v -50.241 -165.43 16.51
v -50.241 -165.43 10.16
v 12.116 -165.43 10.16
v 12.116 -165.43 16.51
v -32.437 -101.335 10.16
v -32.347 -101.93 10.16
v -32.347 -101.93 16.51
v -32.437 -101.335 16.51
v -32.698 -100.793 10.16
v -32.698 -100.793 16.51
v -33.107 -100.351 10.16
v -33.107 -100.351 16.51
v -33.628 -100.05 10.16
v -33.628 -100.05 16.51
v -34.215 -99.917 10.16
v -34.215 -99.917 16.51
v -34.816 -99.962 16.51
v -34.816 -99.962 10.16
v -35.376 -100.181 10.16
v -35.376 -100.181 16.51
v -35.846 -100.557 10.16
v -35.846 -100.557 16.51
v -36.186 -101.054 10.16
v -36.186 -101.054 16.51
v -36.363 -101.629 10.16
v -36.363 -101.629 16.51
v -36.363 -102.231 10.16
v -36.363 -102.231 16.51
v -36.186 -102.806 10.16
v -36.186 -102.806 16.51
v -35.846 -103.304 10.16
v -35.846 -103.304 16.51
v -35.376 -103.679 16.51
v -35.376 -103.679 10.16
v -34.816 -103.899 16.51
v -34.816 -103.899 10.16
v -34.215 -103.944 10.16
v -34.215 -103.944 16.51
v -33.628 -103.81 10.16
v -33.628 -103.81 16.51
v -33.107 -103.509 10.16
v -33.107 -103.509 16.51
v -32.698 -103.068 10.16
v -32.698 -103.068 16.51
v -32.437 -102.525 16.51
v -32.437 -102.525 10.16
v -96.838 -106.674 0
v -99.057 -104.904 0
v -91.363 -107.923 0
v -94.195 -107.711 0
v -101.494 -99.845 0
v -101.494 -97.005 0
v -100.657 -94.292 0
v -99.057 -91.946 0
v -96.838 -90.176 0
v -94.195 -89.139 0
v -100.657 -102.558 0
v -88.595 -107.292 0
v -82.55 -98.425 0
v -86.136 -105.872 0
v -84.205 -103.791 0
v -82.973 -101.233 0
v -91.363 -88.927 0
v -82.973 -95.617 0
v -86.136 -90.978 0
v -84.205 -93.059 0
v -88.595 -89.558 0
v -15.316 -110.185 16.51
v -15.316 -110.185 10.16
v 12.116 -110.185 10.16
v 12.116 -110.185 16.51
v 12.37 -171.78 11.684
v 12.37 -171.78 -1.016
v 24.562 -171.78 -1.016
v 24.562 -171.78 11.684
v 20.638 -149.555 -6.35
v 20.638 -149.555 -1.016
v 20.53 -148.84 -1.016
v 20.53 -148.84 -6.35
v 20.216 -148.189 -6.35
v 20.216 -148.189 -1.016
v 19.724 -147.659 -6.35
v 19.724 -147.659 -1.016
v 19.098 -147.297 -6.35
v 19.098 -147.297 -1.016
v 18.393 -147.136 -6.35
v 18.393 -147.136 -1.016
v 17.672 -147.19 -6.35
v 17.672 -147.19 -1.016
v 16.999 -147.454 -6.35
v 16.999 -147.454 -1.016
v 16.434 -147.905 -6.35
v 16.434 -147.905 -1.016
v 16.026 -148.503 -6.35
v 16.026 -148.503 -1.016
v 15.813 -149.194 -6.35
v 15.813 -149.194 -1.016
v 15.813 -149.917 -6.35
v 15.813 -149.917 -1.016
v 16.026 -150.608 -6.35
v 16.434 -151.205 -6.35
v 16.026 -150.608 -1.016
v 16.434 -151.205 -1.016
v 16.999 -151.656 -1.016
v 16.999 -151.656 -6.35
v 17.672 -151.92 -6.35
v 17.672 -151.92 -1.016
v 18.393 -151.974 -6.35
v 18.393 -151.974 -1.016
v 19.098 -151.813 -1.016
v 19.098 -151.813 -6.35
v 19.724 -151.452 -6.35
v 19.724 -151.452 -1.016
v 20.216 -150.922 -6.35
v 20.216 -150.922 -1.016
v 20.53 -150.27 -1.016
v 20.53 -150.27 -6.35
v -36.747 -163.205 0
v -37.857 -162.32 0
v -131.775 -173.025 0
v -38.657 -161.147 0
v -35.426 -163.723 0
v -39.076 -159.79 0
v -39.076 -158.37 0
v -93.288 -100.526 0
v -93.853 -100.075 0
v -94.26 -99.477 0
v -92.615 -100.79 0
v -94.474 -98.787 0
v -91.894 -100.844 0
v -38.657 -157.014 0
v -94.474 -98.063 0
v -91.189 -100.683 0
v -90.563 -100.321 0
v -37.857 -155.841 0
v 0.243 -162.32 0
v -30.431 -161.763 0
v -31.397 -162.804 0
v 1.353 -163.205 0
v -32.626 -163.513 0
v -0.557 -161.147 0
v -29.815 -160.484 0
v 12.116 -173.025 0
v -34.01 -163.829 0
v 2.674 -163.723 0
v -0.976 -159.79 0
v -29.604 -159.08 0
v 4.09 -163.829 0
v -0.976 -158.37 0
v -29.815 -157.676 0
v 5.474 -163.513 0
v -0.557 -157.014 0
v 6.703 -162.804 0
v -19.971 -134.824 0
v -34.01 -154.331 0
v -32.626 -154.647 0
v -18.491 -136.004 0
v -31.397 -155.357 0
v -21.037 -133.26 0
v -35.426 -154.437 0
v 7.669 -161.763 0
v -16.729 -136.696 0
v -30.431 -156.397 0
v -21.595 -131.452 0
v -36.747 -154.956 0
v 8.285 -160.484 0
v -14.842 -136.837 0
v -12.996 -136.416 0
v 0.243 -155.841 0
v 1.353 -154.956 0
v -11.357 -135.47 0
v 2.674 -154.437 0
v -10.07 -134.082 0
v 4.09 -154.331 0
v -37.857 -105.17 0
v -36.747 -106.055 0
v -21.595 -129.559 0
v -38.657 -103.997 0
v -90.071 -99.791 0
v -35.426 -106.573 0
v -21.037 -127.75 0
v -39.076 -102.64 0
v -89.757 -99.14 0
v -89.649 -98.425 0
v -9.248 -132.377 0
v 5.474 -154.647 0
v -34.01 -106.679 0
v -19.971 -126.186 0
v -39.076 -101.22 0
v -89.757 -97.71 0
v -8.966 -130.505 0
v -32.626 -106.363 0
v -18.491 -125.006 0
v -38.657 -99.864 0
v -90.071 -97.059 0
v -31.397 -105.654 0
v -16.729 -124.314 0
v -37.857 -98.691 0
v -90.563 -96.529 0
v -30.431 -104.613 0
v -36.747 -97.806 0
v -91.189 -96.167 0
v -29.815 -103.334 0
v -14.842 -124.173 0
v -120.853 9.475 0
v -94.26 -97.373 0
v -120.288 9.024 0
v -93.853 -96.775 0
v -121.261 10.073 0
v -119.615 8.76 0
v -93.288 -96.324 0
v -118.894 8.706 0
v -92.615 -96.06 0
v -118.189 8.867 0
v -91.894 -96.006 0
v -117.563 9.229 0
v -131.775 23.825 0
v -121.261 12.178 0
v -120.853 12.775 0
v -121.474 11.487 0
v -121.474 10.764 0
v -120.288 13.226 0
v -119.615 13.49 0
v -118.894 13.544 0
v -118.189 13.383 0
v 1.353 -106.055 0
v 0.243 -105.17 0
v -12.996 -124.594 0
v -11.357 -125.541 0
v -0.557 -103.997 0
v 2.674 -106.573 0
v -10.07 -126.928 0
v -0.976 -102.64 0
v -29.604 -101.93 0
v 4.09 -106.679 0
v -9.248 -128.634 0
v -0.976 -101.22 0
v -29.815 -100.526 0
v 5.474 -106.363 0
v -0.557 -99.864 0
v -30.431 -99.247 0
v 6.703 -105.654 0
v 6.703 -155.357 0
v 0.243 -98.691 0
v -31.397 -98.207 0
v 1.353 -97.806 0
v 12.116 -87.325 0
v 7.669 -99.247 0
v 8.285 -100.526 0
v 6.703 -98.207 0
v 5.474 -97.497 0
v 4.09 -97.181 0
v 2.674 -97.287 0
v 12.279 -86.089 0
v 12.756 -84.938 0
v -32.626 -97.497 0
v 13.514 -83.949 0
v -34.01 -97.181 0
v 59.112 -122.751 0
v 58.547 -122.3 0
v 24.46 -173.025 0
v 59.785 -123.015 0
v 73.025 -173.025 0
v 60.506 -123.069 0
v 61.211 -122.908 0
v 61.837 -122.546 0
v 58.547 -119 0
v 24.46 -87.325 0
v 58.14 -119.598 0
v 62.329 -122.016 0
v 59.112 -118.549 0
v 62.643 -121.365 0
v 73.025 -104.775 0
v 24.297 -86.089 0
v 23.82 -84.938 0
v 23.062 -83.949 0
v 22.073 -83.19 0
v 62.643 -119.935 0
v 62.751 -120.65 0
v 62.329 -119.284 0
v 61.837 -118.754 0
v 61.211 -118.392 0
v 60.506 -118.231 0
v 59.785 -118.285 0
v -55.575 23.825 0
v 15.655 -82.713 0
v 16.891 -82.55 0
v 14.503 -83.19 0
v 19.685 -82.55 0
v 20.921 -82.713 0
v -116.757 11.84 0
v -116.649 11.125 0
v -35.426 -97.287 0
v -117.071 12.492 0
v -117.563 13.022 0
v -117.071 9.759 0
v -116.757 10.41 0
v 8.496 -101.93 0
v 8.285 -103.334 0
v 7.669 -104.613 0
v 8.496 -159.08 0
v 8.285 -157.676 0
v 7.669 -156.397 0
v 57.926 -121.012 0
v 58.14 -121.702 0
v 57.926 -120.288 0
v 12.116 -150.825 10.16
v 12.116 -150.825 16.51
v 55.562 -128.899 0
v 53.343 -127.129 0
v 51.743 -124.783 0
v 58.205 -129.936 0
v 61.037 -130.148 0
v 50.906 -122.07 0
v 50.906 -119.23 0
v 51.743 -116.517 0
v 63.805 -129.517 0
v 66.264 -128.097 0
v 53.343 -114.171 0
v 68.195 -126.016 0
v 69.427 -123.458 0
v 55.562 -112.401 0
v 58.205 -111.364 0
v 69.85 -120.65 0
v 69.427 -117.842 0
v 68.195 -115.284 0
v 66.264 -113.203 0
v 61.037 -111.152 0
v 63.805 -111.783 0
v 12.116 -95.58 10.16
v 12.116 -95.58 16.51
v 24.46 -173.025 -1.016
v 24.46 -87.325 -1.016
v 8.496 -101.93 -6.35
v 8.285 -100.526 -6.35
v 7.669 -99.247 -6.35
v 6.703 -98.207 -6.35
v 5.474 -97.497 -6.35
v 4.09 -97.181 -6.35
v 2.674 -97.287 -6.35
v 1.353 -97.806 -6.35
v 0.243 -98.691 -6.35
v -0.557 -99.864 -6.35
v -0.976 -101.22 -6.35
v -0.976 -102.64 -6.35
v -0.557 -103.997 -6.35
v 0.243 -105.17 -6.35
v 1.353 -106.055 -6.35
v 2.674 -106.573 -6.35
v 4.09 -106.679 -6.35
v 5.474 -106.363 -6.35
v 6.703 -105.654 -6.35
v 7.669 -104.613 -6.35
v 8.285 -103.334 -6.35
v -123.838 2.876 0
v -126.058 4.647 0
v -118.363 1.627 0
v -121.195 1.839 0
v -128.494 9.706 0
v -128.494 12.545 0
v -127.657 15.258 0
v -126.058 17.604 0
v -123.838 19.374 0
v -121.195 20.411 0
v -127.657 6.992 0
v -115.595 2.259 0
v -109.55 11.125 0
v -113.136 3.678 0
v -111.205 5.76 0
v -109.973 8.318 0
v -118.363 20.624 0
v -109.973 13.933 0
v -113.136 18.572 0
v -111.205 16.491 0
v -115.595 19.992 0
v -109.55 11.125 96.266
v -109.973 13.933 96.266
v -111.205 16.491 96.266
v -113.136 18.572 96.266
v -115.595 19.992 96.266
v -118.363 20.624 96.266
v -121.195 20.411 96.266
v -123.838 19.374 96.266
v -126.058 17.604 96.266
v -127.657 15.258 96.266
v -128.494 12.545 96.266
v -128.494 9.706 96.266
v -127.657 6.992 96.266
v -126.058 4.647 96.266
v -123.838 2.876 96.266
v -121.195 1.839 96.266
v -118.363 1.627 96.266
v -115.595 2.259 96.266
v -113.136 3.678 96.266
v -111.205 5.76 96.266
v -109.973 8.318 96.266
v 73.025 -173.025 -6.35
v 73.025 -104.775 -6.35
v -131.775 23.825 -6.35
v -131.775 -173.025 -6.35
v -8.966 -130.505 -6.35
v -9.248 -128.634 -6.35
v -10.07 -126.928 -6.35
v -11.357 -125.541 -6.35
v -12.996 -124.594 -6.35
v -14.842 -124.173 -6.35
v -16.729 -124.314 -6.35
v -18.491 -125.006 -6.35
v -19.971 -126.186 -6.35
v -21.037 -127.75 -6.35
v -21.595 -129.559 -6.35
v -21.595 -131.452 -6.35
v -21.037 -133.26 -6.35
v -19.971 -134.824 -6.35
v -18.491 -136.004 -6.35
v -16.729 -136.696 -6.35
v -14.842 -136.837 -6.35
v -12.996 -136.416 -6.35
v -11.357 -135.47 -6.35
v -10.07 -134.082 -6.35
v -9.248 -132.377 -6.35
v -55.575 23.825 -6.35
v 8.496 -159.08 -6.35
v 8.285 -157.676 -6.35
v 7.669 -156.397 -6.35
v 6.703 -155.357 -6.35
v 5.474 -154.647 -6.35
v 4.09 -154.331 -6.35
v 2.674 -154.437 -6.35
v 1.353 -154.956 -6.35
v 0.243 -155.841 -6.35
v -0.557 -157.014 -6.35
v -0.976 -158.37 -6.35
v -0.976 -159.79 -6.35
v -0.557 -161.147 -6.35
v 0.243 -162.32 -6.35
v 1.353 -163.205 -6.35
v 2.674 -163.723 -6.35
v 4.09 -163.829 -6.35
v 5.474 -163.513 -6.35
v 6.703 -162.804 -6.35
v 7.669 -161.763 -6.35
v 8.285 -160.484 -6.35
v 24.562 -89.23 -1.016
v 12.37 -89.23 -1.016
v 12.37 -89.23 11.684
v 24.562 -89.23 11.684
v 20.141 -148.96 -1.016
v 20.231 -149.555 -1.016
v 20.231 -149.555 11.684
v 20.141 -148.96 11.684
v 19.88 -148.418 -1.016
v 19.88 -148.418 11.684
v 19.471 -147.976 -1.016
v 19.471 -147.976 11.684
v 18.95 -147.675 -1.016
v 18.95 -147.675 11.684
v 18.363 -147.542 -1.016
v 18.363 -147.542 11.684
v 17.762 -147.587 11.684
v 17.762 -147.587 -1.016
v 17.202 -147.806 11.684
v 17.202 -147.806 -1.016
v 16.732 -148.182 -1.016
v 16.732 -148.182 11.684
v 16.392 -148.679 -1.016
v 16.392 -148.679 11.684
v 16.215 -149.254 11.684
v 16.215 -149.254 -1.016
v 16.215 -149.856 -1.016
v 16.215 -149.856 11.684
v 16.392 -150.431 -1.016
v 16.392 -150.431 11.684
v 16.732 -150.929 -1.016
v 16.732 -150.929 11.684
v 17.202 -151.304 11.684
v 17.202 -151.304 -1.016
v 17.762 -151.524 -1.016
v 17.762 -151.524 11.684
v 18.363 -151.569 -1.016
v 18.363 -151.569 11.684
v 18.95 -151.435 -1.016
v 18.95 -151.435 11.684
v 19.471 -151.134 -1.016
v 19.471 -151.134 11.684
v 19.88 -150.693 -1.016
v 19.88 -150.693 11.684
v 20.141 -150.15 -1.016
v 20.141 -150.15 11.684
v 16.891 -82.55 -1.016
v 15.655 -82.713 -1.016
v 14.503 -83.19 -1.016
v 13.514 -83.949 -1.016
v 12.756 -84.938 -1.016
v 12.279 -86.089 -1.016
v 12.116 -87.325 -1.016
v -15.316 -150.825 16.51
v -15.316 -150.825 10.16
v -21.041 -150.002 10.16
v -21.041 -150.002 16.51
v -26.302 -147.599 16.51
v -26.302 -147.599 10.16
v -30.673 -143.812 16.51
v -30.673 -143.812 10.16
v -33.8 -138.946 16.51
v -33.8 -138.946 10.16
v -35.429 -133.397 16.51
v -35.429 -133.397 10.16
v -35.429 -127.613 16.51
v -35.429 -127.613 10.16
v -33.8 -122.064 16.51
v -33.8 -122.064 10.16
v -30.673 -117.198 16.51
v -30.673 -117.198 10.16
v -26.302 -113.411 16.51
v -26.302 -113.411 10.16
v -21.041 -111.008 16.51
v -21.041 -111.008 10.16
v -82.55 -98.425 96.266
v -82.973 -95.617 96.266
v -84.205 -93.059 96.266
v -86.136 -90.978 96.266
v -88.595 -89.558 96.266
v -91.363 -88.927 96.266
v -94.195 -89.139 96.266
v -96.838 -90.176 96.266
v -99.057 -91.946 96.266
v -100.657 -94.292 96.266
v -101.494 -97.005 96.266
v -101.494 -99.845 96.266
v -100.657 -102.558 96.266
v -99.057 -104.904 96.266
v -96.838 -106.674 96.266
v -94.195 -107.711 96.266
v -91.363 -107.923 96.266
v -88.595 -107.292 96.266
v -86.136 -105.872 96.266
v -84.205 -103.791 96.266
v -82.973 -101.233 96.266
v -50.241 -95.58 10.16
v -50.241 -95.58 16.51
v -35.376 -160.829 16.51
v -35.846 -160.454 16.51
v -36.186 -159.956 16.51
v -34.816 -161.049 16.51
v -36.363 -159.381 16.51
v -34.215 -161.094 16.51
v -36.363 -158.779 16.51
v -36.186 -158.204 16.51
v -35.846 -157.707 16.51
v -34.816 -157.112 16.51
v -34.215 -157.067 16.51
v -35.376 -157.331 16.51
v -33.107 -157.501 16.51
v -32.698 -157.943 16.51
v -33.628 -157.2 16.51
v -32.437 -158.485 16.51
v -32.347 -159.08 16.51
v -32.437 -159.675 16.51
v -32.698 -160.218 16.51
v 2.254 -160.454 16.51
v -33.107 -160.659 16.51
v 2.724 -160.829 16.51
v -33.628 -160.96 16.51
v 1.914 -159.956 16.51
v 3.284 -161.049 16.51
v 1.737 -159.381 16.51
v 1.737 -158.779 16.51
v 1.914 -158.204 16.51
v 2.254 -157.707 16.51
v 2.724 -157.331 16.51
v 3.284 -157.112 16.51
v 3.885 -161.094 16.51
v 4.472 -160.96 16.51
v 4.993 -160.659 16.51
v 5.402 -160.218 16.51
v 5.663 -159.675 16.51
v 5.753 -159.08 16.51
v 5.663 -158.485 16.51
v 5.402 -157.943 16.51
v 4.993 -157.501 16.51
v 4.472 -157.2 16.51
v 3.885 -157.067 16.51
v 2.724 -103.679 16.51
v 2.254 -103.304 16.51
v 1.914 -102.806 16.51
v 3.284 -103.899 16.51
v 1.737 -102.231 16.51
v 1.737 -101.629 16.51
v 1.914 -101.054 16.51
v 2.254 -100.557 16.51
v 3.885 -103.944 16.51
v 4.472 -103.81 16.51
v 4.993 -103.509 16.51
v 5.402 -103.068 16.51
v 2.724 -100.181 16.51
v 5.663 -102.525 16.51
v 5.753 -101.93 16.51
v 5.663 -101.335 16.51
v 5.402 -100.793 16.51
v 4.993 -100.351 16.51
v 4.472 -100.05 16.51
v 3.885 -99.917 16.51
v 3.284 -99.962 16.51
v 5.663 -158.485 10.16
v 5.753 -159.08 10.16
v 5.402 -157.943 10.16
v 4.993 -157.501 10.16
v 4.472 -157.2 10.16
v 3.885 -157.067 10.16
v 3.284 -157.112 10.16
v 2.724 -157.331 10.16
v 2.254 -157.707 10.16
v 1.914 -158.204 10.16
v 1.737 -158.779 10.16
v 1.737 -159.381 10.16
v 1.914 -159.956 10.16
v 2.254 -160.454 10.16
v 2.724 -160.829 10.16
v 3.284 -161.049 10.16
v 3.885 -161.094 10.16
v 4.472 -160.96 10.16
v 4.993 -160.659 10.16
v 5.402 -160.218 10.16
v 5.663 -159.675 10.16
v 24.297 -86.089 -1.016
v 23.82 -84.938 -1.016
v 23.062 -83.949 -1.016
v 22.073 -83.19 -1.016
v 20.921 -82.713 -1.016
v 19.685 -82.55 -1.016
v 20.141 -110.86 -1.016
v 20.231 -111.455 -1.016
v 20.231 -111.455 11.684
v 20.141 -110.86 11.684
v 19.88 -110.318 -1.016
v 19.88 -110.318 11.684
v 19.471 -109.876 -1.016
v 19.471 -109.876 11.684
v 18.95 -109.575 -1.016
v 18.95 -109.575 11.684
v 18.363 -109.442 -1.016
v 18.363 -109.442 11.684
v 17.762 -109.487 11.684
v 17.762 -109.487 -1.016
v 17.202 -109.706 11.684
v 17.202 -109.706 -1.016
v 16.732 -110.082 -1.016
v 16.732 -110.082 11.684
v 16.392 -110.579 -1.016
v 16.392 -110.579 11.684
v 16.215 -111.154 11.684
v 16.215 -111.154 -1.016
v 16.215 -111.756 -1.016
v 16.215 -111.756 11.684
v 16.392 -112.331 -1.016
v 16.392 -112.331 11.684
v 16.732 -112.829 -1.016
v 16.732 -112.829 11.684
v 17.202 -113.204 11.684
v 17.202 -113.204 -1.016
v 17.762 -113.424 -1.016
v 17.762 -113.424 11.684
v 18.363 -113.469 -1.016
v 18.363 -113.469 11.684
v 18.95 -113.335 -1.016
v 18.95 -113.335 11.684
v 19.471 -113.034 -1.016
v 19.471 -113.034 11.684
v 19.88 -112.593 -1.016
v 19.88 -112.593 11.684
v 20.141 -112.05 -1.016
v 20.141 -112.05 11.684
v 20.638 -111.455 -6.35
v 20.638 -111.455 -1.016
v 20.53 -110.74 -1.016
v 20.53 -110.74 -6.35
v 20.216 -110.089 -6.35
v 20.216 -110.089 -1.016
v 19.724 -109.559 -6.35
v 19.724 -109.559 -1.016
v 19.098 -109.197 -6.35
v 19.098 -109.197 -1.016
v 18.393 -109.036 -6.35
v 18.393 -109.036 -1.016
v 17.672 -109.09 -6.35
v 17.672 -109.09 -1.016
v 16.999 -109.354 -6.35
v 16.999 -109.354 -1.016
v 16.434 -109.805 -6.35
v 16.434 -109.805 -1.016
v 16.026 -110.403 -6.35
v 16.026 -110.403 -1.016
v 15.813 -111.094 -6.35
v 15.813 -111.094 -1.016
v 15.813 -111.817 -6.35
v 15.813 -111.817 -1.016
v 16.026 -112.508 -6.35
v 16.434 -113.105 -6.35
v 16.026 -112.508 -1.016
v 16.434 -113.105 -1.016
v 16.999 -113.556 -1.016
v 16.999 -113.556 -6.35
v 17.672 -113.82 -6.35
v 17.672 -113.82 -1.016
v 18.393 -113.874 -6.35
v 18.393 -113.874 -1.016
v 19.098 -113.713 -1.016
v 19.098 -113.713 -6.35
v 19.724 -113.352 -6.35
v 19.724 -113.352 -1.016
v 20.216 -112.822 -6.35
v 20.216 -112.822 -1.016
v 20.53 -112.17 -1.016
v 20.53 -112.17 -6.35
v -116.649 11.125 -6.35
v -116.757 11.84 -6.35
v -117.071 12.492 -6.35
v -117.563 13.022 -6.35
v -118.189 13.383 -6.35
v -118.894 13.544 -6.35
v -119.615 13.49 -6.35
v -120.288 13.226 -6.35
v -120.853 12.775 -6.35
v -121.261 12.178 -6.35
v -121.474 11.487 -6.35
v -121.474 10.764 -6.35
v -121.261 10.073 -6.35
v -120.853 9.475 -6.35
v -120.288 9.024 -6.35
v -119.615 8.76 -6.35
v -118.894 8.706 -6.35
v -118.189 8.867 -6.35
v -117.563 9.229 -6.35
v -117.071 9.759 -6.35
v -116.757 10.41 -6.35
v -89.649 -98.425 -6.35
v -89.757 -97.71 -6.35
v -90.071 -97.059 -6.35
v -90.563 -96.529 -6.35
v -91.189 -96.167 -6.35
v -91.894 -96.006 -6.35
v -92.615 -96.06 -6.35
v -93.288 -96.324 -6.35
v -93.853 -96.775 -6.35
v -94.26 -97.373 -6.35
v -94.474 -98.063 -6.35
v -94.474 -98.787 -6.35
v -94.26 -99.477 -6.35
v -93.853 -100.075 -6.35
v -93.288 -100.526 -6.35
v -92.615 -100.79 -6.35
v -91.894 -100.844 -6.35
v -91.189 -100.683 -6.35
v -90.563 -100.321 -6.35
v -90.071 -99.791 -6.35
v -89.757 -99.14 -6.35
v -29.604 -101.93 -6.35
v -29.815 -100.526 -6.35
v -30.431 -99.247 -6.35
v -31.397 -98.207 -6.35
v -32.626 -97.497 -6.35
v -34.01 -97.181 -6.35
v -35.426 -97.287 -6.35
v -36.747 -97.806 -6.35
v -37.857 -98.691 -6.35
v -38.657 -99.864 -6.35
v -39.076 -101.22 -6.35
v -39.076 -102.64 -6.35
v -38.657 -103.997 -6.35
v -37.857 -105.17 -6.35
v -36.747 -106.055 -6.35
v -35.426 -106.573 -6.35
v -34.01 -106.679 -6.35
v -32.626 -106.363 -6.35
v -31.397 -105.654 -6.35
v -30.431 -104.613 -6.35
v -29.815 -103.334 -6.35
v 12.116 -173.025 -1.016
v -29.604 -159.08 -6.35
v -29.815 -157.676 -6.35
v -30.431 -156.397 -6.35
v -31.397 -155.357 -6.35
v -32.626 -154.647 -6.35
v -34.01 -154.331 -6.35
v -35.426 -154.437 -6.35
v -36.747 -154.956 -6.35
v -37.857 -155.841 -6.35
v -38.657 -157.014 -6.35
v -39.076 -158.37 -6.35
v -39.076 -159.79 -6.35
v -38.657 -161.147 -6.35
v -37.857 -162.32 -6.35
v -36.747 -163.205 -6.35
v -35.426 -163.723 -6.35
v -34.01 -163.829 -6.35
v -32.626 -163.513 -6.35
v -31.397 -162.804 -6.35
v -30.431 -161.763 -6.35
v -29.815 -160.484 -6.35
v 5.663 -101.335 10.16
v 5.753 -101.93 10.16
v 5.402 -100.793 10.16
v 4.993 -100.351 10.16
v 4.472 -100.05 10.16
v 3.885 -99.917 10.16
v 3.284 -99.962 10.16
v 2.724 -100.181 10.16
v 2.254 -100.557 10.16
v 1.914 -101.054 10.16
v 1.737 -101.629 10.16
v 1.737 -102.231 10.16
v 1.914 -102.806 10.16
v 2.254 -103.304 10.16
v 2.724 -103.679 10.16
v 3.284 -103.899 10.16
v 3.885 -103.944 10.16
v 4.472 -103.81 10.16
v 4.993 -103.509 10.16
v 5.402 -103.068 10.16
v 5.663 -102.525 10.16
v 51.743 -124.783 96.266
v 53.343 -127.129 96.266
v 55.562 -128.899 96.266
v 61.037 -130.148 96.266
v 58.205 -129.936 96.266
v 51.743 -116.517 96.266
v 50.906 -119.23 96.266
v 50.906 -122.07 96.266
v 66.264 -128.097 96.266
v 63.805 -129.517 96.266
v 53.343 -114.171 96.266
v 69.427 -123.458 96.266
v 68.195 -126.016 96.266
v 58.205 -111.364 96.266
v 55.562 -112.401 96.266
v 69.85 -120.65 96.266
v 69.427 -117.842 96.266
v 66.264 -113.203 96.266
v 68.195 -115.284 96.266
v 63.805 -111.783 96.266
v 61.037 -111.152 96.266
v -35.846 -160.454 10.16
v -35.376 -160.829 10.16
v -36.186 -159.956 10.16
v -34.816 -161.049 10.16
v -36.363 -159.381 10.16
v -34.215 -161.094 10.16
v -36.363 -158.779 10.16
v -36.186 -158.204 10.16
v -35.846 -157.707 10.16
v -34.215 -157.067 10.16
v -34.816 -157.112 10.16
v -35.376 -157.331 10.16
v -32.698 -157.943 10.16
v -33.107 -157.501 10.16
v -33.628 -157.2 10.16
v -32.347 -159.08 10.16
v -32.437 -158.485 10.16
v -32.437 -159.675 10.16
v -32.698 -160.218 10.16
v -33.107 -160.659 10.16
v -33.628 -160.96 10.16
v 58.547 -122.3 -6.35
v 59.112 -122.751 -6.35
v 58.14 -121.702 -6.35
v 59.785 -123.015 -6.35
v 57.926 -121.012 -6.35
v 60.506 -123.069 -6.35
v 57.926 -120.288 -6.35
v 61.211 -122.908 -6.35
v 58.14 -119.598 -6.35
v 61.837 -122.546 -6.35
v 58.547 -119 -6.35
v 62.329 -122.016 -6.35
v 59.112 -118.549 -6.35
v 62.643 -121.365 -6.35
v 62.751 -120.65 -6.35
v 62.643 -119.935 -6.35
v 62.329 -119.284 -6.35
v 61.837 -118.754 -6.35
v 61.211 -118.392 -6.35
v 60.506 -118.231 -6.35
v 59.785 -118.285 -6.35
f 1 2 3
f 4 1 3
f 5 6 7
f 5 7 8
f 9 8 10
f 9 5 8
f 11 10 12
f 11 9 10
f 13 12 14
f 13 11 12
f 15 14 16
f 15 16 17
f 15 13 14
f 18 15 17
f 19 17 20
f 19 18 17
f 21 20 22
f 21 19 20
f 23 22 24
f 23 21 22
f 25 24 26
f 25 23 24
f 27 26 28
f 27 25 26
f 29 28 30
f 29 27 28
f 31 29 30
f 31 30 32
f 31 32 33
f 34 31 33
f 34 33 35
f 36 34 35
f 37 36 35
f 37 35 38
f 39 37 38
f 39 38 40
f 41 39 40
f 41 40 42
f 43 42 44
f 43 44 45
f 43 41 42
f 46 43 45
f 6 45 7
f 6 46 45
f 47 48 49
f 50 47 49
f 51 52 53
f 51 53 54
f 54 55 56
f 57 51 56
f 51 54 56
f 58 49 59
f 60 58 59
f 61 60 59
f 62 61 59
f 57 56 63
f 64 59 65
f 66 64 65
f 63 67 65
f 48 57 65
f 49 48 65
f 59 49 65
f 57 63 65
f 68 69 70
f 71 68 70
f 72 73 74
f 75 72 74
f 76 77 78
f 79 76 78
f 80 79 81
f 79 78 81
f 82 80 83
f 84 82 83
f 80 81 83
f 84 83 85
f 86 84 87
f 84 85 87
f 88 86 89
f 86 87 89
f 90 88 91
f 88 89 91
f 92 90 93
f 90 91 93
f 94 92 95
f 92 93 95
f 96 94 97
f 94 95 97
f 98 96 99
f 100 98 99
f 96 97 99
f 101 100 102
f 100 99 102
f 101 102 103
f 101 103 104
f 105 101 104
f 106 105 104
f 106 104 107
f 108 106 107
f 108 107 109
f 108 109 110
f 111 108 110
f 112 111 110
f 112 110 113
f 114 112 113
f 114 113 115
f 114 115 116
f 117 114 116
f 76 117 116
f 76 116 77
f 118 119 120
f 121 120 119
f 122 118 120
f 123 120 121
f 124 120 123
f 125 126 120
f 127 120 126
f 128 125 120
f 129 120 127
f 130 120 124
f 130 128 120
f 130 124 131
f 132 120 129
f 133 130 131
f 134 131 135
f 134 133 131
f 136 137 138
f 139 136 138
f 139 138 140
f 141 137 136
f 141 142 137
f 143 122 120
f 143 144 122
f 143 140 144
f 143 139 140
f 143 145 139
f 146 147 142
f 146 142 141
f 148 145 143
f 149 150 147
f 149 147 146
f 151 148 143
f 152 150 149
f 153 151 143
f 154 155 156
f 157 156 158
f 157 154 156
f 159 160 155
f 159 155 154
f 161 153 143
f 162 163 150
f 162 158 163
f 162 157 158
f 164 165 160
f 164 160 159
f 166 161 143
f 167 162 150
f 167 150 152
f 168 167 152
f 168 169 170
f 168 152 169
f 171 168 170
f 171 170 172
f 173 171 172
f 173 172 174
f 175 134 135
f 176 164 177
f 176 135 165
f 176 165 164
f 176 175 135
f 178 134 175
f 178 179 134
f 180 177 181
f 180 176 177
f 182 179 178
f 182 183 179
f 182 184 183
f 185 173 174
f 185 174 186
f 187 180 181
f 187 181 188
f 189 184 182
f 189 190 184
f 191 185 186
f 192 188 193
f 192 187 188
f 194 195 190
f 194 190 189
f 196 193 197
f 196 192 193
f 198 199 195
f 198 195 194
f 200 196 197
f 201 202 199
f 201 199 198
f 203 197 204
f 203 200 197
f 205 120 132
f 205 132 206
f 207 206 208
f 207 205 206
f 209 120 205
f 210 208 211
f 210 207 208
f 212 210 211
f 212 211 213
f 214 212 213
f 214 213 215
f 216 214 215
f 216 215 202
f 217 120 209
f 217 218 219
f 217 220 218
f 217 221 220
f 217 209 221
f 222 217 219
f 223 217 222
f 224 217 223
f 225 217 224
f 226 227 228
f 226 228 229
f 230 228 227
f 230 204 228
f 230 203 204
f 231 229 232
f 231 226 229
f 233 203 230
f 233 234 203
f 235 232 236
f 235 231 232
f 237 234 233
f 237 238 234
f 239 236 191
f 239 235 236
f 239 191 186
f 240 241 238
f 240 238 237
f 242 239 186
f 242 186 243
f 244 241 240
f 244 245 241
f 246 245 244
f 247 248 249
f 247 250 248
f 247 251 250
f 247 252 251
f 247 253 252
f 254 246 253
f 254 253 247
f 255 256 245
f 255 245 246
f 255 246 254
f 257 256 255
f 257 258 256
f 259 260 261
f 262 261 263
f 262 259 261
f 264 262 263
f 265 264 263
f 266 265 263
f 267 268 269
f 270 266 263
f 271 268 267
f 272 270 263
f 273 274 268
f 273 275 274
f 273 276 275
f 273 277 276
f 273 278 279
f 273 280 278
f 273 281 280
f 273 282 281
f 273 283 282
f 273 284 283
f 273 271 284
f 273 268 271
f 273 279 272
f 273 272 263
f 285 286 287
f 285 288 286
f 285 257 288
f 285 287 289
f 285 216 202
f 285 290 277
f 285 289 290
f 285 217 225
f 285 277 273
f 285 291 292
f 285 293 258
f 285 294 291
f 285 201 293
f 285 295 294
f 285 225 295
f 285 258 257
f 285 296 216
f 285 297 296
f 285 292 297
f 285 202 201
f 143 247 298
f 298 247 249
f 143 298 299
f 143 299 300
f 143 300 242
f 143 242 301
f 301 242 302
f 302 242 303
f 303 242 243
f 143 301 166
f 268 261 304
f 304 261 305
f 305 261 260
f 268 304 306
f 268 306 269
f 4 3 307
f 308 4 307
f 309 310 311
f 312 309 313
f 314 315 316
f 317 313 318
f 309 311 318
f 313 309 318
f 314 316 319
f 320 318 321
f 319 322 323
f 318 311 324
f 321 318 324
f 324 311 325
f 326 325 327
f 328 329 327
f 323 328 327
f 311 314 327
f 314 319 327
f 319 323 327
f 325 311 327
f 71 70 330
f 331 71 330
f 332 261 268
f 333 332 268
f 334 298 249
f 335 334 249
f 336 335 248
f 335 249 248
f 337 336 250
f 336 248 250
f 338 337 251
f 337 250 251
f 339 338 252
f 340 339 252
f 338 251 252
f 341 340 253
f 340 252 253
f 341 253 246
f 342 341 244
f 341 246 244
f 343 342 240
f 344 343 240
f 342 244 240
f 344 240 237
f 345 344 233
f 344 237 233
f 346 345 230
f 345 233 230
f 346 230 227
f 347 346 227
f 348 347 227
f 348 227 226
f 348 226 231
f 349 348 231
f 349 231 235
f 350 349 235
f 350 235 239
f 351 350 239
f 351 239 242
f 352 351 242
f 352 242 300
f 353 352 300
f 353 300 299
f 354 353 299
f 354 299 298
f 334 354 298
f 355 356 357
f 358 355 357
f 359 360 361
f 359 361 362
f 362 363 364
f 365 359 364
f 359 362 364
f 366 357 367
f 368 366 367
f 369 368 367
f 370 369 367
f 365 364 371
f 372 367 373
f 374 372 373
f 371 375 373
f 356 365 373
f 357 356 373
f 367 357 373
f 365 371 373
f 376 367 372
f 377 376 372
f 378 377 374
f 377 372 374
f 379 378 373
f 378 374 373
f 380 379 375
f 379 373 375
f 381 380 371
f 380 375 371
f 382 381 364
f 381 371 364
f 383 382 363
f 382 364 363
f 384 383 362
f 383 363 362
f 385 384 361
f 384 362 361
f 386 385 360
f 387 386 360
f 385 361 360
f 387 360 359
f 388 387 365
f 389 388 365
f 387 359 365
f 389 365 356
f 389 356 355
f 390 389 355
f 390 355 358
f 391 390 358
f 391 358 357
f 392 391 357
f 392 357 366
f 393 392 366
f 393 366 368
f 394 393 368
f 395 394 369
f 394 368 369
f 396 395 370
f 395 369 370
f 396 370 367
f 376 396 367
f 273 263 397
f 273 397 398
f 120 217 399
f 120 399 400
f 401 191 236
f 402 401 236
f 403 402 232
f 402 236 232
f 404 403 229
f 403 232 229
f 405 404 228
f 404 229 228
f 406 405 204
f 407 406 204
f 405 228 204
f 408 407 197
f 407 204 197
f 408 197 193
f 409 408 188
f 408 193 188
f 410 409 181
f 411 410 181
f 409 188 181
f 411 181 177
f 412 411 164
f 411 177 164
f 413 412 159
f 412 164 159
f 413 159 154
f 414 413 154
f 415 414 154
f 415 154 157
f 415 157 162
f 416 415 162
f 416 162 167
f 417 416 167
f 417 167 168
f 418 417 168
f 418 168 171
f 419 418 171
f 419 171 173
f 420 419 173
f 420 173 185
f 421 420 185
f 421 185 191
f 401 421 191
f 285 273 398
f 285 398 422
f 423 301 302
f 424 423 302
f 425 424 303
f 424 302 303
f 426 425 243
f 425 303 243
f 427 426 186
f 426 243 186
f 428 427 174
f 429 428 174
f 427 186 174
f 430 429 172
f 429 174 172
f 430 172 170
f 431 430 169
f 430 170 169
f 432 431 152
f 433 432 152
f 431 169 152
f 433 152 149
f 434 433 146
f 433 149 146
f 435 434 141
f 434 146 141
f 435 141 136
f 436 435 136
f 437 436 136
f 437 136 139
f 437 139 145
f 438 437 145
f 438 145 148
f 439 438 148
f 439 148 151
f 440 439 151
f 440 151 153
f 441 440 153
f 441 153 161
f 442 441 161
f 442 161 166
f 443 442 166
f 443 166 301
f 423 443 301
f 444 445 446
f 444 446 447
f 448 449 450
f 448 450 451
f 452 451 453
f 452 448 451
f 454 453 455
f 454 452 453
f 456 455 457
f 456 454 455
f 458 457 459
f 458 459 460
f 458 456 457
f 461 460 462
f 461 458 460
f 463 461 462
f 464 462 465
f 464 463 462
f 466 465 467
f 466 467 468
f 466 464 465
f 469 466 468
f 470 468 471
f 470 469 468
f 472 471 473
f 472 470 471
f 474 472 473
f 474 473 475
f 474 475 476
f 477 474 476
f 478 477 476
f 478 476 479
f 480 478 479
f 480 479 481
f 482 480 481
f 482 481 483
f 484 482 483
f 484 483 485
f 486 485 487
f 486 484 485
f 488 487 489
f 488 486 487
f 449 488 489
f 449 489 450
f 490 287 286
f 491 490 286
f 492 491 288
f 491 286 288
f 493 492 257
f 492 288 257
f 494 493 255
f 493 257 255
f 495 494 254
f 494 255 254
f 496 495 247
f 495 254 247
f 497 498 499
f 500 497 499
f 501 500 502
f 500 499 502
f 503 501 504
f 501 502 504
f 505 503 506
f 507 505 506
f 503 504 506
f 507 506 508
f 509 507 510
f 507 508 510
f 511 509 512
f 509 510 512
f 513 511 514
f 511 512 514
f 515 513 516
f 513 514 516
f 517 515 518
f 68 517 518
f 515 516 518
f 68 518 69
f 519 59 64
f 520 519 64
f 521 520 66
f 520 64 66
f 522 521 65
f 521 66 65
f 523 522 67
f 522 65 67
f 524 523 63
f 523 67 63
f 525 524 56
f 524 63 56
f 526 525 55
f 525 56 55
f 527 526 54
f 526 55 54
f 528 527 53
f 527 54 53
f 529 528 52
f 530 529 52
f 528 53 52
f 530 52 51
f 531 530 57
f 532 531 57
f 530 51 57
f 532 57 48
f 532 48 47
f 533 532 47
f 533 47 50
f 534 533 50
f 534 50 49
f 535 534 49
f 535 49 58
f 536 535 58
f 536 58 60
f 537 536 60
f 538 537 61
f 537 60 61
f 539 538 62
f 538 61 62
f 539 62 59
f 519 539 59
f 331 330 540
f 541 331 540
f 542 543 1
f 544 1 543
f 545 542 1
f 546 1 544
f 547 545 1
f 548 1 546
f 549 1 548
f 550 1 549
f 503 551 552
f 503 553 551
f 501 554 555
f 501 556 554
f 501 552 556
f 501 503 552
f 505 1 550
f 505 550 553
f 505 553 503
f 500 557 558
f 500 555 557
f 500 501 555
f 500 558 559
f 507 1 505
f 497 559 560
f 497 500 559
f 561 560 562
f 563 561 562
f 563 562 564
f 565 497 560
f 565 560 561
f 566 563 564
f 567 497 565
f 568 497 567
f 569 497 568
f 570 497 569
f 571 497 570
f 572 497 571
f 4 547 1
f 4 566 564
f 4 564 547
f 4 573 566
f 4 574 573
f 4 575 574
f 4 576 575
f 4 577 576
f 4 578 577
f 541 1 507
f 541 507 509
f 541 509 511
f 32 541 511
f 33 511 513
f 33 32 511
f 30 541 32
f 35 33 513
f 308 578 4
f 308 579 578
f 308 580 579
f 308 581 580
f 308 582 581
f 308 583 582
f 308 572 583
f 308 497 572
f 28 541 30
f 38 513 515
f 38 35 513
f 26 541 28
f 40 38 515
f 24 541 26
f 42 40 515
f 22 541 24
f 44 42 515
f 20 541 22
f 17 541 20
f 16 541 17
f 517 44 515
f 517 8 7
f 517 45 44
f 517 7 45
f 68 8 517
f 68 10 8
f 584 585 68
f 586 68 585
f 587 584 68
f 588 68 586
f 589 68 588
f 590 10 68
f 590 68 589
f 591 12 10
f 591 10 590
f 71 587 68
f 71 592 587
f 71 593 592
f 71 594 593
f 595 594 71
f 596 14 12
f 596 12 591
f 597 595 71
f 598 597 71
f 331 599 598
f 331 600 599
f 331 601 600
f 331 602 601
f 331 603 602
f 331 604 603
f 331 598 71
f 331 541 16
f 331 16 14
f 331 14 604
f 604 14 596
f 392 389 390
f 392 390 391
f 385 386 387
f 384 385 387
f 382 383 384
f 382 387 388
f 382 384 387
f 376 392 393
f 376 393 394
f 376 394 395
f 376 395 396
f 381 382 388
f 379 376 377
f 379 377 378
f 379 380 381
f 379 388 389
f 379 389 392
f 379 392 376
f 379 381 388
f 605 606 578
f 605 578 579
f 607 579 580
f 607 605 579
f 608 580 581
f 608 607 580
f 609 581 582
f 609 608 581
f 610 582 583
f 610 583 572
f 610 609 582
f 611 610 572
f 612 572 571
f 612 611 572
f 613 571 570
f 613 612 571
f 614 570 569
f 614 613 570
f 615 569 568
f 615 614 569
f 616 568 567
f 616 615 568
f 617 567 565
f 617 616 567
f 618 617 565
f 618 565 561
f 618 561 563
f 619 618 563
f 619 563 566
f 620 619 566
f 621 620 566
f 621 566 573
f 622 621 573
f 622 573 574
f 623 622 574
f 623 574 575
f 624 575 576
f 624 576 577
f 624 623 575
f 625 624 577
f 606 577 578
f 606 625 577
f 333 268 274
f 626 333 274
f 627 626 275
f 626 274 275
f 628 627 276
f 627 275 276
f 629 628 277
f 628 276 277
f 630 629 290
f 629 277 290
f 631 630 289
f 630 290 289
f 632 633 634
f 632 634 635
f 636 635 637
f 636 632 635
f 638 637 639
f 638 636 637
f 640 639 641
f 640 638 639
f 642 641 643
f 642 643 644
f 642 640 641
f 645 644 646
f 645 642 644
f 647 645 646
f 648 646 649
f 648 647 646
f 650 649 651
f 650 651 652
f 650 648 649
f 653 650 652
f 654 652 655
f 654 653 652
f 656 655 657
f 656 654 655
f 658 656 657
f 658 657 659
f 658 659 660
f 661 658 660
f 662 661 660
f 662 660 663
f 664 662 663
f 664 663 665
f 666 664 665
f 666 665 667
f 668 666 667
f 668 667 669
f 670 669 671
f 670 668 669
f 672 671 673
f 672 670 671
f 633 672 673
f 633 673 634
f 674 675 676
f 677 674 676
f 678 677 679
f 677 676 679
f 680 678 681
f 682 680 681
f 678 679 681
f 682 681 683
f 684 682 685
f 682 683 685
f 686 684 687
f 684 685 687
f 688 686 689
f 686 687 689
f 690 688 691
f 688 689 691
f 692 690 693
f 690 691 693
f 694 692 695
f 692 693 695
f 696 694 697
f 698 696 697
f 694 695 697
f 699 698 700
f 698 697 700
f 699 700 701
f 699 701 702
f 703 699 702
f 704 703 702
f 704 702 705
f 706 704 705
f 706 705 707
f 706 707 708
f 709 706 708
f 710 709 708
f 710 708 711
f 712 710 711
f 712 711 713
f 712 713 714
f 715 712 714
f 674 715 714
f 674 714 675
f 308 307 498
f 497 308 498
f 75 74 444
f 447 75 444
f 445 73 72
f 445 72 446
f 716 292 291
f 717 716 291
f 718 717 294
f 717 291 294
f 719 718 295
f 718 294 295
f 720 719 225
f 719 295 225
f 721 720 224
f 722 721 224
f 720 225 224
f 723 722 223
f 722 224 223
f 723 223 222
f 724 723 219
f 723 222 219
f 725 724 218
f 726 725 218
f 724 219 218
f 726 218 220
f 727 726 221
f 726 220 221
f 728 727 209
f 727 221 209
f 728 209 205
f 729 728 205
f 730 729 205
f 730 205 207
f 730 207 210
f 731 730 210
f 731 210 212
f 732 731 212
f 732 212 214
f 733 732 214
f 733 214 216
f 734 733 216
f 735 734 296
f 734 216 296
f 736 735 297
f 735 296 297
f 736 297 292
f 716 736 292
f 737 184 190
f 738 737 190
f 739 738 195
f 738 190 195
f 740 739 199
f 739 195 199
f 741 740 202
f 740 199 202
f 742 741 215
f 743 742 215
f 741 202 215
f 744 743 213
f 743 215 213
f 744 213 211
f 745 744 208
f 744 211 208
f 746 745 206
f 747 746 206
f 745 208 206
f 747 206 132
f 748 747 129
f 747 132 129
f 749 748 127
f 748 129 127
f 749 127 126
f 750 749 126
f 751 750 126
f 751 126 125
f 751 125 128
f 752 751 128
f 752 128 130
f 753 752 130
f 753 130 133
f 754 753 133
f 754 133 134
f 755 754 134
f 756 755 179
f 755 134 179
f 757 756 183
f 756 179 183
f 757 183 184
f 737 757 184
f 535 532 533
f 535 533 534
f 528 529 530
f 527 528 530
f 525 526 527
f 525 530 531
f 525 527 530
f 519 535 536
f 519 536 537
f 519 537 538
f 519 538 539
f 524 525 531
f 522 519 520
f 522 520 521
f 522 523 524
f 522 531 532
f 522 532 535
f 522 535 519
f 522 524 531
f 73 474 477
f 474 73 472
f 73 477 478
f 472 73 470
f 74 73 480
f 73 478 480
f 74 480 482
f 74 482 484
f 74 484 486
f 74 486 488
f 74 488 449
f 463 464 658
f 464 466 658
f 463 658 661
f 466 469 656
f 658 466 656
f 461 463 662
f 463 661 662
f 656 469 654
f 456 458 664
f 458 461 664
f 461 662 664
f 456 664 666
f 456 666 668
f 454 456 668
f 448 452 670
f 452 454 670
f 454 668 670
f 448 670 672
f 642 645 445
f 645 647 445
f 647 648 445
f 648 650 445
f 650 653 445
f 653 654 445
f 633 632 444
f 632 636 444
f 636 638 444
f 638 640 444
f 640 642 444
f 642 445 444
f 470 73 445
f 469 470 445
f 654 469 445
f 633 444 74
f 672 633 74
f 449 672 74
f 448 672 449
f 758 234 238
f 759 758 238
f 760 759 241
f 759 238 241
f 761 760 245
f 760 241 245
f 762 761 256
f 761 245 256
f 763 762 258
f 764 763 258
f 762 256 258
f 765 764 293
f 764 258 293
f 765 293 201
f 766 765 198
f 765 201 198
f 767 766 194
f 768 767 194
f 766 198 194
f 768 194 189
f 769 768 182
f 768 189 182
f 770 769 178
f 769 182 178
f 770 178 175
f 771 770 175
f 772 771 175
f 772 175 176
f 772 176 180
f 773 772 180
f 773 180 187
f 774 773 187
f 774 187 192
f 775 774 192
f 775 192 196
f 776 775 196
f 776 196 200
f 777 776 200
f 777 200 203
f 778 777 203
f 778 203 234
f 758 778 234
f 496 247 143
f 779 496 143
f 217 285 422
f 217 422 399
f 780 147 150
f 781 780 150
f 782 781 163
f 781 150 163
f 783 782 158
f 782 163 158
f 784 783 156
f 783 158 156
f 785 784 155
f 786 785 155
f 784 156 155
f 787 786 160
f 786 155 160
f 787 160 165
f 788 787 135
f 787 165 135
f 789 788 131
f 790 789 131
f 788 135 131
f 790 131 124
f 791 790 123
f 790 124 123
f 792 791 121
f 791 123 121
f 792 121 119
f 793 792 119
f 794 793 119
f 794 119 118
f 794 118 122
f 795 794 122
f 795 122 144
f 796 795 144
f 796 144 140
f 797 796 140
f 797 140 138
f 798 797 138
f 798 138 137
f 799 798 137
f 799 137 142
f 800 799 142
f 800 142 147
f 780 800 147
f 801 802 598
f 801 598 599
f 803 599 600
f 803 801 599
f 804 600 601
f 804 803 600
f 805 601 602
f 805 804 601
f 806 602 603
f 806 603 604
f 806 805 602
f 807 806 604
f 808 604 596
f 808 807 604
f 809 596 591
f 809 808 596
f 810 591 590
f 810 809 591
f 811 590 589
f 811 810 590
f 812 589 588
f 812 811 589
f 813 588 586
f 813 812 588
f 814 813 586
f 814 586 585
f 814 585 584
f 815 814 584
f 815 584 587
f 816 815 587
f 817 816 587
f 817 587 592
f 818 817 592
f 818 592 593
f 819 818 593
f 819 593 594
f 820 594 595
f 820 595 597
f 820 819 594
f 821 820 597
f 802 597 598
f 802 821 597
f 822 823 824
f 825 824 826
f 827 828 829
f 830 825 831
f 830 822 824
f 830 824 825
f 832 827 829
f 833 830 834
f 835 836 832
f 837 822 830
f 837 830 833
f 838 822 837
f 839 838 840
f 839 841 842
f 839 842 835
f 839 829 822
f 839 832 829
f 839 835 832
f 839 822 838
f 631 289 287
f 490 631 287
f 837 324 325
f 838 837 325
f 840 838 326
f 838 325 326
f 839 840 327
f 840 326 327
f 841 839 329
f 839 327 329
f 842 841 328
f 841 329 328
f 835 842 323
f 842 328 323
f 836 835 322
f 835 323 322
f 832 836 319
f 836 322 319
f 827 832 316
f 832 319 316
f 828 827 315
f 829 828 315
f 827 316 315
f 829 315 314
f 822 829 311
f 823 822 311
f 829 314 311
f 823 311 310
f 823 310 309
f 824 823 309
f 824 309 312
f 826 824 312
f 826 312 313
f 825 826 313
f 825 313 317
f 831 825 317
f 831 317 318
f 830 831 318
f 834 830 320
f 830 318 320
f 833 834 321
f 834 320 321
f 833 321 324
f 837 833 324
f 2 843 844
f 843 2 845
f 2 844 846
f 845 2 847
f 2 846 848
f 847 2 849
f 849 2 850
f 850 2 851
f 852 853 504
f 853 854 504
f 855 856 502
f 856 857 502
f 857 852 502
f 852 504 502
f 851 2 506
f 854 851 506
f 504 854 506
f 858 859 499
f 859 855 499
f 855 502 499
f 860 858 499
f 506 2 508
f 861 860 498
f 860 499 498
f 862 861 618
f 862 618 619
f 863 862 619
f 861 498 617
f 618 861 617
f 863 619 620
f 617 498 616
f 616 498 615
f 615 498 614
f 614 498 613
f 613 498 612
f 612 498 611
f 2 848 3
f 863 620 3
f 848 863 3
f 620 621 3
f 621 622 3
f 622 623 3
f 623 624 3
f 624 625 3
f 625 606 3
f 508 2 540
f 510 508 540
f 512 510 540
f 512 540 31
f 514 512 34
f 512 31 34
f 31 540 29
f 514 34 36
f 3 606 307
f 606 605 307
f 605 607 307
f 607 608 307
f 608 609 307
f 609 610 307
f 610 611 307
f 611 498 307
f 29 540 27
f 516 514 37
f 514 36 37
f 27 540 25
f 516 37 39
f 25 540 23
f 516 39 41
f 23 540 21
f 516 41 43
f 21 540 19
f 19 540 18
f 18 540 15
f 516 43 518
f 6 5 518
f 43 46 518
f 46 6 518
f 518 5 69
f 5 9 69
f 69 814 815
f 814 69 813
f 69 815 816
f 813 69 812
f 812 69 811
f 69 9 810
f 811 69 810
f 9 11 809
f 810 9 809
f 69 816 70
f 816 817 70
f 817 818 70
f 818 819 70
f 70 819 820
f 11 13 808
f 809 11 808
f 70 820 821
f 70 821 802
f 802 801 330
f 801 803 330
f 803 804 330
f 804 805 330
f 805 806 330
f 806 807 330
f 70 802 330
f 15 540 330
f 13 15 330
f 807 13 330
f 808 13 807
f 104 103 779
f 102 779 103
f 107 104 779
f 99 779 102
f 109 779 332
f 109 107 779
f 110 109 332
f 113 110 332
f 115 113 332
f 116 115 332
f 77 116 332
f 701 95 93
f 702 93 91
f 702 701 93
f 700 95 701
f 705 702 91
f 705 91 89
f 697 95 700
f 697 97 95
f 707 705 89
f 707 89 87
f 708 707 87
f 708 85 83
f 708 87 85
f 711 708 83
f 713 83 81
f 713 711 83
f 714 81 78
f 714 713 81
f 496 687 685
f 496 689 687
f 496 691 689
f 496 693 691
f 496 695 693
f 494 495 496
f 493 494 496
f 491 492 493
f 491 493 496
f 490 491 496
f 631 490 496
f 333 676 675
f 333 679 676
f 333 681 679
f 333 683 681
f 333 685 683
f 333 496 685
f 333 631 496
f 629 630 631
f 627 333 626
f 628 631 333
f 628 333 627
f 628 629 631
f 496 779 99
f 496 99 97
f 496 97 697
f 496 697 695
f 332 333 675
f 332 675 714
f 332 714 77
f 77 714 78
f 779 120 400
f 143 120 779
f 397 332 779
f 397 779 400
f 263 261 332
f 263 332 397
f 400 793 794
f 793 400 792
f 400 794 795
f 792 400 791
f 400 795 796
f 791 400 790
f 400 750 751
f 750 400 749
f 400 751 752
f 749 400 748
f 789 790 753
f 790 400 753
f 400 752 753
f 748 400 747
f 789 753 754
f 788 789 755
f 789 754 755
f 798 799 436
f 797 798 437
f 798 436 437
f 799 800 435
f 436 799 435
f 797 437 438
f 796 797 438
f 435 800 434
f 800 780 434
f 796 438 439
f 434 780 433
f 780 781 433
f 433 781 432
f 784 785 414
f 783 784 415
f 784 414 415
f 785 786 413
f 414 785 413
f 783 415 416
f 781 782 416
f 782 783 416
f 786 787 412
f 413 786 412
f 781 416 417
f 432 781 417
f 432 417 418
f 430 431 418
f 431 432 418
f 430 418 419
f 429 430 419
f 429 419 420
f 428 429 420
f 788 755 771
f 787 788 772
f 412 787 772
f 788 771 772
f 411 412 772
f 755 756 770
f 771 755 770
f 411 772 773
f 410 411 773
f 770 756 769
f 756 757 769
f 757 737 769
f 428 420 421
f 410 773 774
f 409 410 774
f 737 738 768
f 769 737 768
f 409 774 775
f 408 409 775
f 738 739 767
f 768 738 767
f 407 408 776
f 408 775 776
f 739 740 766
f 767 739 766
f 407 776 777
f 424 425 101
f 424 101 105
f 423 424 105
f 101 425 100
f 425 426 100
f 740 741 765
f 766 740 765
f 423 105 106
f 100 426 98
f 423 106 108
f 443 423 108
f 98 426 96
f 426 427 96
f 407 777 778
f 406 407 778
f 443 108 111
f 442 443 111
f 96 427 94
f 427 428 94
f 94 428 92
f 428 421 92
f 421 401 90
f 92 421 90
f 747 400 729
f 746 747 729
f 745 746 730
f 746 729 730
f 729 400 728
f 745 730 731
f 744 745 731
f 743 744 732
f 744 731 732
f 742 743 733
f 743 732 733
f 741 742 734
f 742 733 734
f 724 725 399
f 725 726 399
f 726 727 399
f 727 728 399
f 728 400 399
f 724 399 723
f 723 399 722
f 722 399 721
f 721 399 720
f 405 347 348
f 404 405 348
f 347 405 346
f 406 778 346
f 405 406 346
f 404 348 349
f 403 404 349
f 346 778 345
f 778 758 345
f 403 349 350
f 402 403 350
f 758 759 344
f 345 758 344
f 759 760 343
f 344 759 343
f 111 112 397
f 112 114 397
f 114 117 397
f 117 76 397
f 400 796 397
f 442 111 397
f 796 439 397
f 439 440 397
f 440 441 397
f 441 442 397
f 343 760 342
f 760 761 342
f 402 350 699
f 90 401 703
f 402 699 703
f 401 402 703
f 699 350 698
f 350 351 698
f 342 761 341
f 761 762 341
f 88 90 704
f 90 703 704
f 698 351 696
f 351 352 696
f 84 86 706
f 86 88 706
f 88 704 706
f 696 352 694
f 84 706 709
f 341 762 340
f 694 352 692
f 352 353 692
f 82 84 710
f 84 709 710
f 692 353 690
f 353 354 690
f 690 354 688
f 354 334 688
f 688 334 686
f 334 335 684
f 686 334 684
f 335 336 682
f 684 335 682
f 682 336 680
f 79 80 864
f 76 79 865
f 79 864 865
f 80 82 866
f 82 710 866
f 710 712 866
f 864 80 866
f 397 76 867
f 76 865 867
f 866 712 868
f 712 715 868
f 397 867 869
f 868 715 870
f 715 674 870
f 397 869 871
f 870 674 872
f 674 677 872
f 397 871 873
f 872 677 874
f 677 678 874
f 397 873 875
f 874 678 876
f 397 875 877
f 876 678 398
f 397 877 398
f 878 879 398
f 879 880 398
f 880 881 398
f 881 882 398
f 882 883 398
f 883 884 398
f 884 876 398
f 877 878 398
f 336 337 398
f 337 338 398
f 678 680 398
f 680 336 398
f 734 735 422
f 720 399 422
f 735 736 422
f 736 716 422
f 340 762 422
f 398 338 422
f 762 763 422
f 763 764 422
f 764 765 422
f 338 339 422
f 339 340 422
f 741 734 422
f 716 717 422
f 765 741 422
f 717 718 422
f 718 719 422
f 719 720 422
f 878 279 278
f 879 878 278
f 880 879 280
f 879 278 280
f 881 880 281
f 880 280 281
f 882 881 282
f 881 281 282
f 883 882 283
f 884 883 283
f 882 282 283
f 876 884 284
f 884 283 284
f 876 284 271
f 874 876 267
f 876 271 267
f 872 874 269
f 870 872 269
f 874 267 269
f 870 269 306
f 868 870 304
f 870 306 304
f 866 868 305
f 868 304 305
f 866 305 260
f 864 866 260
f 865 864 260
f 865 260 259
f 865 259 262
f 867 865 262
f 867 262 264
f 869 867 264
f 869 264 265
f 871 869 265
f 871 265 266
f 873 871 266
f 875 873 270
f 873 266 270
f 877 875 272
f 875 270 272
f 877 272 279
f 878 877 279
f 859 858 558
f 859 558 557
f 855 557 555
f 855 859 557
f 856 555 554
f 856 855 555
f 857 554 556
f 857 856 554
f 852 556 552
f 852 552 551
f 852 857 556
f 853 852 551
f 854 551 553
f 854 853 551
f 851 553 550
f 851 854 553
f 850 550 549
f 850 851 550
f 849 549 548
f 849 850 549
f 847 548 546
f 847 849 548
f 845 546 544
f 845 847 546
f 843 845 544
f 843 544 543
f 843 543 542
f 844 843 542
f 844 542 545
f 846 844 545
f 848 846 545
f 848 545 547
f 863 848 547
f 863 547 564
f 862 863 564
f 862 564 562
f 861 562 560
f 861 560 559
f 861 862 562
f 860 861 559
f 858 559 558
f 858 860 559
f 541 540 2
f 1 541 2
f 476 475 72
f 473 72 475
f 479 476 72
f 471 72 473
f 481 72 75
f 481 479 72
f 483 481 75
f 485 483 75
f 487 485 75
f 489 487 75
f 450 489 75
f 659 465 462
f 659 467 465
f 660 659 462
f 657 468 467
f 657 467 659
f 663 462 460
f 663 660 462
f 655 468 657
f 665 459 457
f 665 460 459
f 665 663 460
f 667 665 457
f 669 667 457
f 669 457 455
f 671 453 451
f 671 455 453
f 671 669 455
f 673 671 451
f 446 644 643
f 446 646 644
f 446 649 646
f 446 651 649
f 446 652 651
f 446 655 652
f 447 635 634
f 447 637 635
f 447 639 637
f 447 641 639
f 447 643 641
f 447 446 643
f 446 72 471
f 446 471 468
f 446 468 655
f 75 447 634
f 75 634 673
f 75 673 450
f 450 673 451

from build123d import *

# Parameters (mm, degrees)
SKETCH1_R             = 2.4257
BOSS_EXTRUDE1_DEPTH   = 6.35
SKETCH4_R             = 6.35
SKETCH4_R_2           = 4.7625
SKETCH4_R_3           = 2.4257
CUT_EXTRUDE1_DEPTH    = 12.7
CUT_EXTRUDE2_DEPTH    = 1.016
SKETCH2_R             = 9.525
BOSS_EXTRUDE2_DEPTH   = 96.266
BOSS_EXTRUDE2_2_DEPTH = 96.266
BOSS_EXTRUDE2_3_DEPTH = 96.266
SKETCH3_W             = 12.192
SKETCH3_H             = 82.55
SKETCH3_R             = 2.0193
BOSS_EXTRUDE3_DEPTH   = 12.7
SKETCH5_R             = 2.0193
BOSS_EXTRUDE4_DEPTH   = 6.35


with BuildPart() as part:
    # Sketch1 → Boss-Extrude1 (new body)
    with BuildSketch(Plane.XY):
        Polygon((-131.7752, 23.8252), (-131.7752, -173.0248), (73.025, -173.0248), (73.025, -104.775), (-55.5752, 23.8252), align=None)
        with Locations((-92.075, -98.425)):
            Circle(SKETCH1_R, mode=Mode.SUBTRACT)
        with Locations((-119.0752, 11.1252)):
            Circle(SKETCH1_R, mode=Mode.SUBTRACT)
        with Locations((60.325, -120.65)):
            Circle(SKETCH1_R, mode=Mode.SUBTRACT)
    extrude(amount=-BOSS_EXTRUDE1_DEPTH)

    # Sketch4 → Cut-Extrude1 (cut)
    with BuildSketch(Plane.XY):
        with Locations((-15.3162, -130.5052)):
            Circle(SKETCH4_R)
        with Locations((3.7338, -101.9302)):
            Circle(SKETCH4_R_2)
        with Locations((-34.3662, -101.9302)):
            Circle(SKETCH4_R_2)
        with Locations((-34.3662, -159.0802)):
            Circle(SKETCH4_R_2)
        with Locations((3.7338, -159.0802)):
            Circle(SKETCH4_R_2)
        with Locations((18.2118, -111.4552)):
            Circle(SKETCH4_R_3)
        with Locations((18.2118, -149.5552)):
            Circle(SKETCH4_R_3)
    extrude(amount=-CUT_EXTRUDE1_DEPTH, mode=Mode.SUBTRACT)

    # Sketch6 → Cut-Extrude2 (cut)
    with BuildSketch(Plane.XY):
        with BuildLine():
            Line((12.1158, -87.3252), (12.1158, -179.3748))
            ThreePointArc((12.1158, -179.3748), (13.514423698, -182.751376302), (16.891, -184.15))
            Line((16.891, -184.15), (19.685, -184.15))
            ThreePointArc((19.685, -184.15), (23.061576302, -182.751376302), (24.4602, -179.3748))
            Line((24.4602, -179.3748), (24.4602, -87.3252))
            ThreePointArc((24.4602, -87.3252), (23.061576302, -83.948623698), (19.685, -82.55))
            Line((19.685, -82.55), (16.891, -82.55))
            ThreePointArc((16.891, -82.55), (13.514423698, -83.948623698), (12.1158, -87.3252))
        make_face()
    extrude(amount=-CUT_EXTRUDE2_DEPTH, mode=Mode.SUBTRACT)


with BuildPart() as body_2:
    # Sketch2 → Boss-Extrude2 (new body)
    with BuildSketch(Plane.XY):
        with Locations((-119.0752, 11.1252)):
            Circle(SKETCH2_R)
    extrude(amount=BOSS_EXTRUDE2_DEPTH)


with BuildPart() as body_3:
    # Sketch2 → Boss-Extrude2 2 (new body)
    with BuildSketch(Plane.XY):
        with Locations((-92.075, -98.425)):
            Circle(SKETCH2_R)
    extrude(amount=BOSS_EXTRUDE2_2_DEPTH)


with BuildPart() as body_4:
    # Sketch2 → Boss-Extrude2 3 (new body)
    with BuildSketch(Plane.XY):
        with Locations((60.325, -120.65)):
            Circle(SKETCH2_R)
    extrude(amount=BOSS_EXTRUDE2_3_DEPTH)


with BuildPart() as body_5:
    # Sketch3 → Boss-Extrude3 (new body)
    with BuildSketch(Plane.XY.offset(-1.016)):
        with Locations((18.4658, -130.5052)):
            Rectangle(SKETCH3_W, SKETCH3_H)
        with Locations((18.2118, -111.4552)):
            Circle(SKETCH3_R, mode=Mode.SUBTRACT)
        with Locations((18.2118, -149.5552)):
            Circle(SKETCH3_R, mode=Mode.SUBTRACT)
    extrude(amount=BOSS_EXTRUDE3_DEPTH)


with BuildPart() as body_6:
    # Sketch5 → Boss-Extrude4 (new body)
    with BuildSketch(Plane.XY.offset(10.16)):
        with BuildLine():
            Line((12.1158, -95.5802), (-50.2412, -95.5802))
            Line((-50.2412, -95.5802), (-50.2412, -165.4302))
            Line((-50.2412, -165.4302), (12.1158, -165.4302))
            Line((12.1158, -165.4302), (12.1158, -150.8252))
            Line((12.1158, -150.8252), (-15.3162, -150.8252))
            ThreePointArc((-15.3162, -150.8252), (-35.6362, -130.5052), (-15.3162, -110.1852))
            Line((-15.3162, -110.1852), (12.1158, -110.1852))
            Line((12.1158, -110.1852), (12.1158, -95.5802))
        make_face()
        with Locations((3.7338, -101.9302)):
            Circle(SKETCH5_R, mode=Mode.SUBTRACT)
        with Locations((-34.3662, -101.9302)):
            Circle(SKETCH5_R, mode=Mode.SUBTRACT)
        with Locations((-34.3662, -159.0802)):
            Circle(SKETCH5_R, mode=Mode.SUBTRACT)
        with Locations((3.7338, -159.0802)):
            Circle(SKETCH5_R, mode=Mode.SUBTRACT)
    extrude(amount=BOSS_EXTRUDE4_DEPTH)


solid = Compound([part.part, body_2.part, body_3.part, body_4.part, body_5.part, body_6.part])
